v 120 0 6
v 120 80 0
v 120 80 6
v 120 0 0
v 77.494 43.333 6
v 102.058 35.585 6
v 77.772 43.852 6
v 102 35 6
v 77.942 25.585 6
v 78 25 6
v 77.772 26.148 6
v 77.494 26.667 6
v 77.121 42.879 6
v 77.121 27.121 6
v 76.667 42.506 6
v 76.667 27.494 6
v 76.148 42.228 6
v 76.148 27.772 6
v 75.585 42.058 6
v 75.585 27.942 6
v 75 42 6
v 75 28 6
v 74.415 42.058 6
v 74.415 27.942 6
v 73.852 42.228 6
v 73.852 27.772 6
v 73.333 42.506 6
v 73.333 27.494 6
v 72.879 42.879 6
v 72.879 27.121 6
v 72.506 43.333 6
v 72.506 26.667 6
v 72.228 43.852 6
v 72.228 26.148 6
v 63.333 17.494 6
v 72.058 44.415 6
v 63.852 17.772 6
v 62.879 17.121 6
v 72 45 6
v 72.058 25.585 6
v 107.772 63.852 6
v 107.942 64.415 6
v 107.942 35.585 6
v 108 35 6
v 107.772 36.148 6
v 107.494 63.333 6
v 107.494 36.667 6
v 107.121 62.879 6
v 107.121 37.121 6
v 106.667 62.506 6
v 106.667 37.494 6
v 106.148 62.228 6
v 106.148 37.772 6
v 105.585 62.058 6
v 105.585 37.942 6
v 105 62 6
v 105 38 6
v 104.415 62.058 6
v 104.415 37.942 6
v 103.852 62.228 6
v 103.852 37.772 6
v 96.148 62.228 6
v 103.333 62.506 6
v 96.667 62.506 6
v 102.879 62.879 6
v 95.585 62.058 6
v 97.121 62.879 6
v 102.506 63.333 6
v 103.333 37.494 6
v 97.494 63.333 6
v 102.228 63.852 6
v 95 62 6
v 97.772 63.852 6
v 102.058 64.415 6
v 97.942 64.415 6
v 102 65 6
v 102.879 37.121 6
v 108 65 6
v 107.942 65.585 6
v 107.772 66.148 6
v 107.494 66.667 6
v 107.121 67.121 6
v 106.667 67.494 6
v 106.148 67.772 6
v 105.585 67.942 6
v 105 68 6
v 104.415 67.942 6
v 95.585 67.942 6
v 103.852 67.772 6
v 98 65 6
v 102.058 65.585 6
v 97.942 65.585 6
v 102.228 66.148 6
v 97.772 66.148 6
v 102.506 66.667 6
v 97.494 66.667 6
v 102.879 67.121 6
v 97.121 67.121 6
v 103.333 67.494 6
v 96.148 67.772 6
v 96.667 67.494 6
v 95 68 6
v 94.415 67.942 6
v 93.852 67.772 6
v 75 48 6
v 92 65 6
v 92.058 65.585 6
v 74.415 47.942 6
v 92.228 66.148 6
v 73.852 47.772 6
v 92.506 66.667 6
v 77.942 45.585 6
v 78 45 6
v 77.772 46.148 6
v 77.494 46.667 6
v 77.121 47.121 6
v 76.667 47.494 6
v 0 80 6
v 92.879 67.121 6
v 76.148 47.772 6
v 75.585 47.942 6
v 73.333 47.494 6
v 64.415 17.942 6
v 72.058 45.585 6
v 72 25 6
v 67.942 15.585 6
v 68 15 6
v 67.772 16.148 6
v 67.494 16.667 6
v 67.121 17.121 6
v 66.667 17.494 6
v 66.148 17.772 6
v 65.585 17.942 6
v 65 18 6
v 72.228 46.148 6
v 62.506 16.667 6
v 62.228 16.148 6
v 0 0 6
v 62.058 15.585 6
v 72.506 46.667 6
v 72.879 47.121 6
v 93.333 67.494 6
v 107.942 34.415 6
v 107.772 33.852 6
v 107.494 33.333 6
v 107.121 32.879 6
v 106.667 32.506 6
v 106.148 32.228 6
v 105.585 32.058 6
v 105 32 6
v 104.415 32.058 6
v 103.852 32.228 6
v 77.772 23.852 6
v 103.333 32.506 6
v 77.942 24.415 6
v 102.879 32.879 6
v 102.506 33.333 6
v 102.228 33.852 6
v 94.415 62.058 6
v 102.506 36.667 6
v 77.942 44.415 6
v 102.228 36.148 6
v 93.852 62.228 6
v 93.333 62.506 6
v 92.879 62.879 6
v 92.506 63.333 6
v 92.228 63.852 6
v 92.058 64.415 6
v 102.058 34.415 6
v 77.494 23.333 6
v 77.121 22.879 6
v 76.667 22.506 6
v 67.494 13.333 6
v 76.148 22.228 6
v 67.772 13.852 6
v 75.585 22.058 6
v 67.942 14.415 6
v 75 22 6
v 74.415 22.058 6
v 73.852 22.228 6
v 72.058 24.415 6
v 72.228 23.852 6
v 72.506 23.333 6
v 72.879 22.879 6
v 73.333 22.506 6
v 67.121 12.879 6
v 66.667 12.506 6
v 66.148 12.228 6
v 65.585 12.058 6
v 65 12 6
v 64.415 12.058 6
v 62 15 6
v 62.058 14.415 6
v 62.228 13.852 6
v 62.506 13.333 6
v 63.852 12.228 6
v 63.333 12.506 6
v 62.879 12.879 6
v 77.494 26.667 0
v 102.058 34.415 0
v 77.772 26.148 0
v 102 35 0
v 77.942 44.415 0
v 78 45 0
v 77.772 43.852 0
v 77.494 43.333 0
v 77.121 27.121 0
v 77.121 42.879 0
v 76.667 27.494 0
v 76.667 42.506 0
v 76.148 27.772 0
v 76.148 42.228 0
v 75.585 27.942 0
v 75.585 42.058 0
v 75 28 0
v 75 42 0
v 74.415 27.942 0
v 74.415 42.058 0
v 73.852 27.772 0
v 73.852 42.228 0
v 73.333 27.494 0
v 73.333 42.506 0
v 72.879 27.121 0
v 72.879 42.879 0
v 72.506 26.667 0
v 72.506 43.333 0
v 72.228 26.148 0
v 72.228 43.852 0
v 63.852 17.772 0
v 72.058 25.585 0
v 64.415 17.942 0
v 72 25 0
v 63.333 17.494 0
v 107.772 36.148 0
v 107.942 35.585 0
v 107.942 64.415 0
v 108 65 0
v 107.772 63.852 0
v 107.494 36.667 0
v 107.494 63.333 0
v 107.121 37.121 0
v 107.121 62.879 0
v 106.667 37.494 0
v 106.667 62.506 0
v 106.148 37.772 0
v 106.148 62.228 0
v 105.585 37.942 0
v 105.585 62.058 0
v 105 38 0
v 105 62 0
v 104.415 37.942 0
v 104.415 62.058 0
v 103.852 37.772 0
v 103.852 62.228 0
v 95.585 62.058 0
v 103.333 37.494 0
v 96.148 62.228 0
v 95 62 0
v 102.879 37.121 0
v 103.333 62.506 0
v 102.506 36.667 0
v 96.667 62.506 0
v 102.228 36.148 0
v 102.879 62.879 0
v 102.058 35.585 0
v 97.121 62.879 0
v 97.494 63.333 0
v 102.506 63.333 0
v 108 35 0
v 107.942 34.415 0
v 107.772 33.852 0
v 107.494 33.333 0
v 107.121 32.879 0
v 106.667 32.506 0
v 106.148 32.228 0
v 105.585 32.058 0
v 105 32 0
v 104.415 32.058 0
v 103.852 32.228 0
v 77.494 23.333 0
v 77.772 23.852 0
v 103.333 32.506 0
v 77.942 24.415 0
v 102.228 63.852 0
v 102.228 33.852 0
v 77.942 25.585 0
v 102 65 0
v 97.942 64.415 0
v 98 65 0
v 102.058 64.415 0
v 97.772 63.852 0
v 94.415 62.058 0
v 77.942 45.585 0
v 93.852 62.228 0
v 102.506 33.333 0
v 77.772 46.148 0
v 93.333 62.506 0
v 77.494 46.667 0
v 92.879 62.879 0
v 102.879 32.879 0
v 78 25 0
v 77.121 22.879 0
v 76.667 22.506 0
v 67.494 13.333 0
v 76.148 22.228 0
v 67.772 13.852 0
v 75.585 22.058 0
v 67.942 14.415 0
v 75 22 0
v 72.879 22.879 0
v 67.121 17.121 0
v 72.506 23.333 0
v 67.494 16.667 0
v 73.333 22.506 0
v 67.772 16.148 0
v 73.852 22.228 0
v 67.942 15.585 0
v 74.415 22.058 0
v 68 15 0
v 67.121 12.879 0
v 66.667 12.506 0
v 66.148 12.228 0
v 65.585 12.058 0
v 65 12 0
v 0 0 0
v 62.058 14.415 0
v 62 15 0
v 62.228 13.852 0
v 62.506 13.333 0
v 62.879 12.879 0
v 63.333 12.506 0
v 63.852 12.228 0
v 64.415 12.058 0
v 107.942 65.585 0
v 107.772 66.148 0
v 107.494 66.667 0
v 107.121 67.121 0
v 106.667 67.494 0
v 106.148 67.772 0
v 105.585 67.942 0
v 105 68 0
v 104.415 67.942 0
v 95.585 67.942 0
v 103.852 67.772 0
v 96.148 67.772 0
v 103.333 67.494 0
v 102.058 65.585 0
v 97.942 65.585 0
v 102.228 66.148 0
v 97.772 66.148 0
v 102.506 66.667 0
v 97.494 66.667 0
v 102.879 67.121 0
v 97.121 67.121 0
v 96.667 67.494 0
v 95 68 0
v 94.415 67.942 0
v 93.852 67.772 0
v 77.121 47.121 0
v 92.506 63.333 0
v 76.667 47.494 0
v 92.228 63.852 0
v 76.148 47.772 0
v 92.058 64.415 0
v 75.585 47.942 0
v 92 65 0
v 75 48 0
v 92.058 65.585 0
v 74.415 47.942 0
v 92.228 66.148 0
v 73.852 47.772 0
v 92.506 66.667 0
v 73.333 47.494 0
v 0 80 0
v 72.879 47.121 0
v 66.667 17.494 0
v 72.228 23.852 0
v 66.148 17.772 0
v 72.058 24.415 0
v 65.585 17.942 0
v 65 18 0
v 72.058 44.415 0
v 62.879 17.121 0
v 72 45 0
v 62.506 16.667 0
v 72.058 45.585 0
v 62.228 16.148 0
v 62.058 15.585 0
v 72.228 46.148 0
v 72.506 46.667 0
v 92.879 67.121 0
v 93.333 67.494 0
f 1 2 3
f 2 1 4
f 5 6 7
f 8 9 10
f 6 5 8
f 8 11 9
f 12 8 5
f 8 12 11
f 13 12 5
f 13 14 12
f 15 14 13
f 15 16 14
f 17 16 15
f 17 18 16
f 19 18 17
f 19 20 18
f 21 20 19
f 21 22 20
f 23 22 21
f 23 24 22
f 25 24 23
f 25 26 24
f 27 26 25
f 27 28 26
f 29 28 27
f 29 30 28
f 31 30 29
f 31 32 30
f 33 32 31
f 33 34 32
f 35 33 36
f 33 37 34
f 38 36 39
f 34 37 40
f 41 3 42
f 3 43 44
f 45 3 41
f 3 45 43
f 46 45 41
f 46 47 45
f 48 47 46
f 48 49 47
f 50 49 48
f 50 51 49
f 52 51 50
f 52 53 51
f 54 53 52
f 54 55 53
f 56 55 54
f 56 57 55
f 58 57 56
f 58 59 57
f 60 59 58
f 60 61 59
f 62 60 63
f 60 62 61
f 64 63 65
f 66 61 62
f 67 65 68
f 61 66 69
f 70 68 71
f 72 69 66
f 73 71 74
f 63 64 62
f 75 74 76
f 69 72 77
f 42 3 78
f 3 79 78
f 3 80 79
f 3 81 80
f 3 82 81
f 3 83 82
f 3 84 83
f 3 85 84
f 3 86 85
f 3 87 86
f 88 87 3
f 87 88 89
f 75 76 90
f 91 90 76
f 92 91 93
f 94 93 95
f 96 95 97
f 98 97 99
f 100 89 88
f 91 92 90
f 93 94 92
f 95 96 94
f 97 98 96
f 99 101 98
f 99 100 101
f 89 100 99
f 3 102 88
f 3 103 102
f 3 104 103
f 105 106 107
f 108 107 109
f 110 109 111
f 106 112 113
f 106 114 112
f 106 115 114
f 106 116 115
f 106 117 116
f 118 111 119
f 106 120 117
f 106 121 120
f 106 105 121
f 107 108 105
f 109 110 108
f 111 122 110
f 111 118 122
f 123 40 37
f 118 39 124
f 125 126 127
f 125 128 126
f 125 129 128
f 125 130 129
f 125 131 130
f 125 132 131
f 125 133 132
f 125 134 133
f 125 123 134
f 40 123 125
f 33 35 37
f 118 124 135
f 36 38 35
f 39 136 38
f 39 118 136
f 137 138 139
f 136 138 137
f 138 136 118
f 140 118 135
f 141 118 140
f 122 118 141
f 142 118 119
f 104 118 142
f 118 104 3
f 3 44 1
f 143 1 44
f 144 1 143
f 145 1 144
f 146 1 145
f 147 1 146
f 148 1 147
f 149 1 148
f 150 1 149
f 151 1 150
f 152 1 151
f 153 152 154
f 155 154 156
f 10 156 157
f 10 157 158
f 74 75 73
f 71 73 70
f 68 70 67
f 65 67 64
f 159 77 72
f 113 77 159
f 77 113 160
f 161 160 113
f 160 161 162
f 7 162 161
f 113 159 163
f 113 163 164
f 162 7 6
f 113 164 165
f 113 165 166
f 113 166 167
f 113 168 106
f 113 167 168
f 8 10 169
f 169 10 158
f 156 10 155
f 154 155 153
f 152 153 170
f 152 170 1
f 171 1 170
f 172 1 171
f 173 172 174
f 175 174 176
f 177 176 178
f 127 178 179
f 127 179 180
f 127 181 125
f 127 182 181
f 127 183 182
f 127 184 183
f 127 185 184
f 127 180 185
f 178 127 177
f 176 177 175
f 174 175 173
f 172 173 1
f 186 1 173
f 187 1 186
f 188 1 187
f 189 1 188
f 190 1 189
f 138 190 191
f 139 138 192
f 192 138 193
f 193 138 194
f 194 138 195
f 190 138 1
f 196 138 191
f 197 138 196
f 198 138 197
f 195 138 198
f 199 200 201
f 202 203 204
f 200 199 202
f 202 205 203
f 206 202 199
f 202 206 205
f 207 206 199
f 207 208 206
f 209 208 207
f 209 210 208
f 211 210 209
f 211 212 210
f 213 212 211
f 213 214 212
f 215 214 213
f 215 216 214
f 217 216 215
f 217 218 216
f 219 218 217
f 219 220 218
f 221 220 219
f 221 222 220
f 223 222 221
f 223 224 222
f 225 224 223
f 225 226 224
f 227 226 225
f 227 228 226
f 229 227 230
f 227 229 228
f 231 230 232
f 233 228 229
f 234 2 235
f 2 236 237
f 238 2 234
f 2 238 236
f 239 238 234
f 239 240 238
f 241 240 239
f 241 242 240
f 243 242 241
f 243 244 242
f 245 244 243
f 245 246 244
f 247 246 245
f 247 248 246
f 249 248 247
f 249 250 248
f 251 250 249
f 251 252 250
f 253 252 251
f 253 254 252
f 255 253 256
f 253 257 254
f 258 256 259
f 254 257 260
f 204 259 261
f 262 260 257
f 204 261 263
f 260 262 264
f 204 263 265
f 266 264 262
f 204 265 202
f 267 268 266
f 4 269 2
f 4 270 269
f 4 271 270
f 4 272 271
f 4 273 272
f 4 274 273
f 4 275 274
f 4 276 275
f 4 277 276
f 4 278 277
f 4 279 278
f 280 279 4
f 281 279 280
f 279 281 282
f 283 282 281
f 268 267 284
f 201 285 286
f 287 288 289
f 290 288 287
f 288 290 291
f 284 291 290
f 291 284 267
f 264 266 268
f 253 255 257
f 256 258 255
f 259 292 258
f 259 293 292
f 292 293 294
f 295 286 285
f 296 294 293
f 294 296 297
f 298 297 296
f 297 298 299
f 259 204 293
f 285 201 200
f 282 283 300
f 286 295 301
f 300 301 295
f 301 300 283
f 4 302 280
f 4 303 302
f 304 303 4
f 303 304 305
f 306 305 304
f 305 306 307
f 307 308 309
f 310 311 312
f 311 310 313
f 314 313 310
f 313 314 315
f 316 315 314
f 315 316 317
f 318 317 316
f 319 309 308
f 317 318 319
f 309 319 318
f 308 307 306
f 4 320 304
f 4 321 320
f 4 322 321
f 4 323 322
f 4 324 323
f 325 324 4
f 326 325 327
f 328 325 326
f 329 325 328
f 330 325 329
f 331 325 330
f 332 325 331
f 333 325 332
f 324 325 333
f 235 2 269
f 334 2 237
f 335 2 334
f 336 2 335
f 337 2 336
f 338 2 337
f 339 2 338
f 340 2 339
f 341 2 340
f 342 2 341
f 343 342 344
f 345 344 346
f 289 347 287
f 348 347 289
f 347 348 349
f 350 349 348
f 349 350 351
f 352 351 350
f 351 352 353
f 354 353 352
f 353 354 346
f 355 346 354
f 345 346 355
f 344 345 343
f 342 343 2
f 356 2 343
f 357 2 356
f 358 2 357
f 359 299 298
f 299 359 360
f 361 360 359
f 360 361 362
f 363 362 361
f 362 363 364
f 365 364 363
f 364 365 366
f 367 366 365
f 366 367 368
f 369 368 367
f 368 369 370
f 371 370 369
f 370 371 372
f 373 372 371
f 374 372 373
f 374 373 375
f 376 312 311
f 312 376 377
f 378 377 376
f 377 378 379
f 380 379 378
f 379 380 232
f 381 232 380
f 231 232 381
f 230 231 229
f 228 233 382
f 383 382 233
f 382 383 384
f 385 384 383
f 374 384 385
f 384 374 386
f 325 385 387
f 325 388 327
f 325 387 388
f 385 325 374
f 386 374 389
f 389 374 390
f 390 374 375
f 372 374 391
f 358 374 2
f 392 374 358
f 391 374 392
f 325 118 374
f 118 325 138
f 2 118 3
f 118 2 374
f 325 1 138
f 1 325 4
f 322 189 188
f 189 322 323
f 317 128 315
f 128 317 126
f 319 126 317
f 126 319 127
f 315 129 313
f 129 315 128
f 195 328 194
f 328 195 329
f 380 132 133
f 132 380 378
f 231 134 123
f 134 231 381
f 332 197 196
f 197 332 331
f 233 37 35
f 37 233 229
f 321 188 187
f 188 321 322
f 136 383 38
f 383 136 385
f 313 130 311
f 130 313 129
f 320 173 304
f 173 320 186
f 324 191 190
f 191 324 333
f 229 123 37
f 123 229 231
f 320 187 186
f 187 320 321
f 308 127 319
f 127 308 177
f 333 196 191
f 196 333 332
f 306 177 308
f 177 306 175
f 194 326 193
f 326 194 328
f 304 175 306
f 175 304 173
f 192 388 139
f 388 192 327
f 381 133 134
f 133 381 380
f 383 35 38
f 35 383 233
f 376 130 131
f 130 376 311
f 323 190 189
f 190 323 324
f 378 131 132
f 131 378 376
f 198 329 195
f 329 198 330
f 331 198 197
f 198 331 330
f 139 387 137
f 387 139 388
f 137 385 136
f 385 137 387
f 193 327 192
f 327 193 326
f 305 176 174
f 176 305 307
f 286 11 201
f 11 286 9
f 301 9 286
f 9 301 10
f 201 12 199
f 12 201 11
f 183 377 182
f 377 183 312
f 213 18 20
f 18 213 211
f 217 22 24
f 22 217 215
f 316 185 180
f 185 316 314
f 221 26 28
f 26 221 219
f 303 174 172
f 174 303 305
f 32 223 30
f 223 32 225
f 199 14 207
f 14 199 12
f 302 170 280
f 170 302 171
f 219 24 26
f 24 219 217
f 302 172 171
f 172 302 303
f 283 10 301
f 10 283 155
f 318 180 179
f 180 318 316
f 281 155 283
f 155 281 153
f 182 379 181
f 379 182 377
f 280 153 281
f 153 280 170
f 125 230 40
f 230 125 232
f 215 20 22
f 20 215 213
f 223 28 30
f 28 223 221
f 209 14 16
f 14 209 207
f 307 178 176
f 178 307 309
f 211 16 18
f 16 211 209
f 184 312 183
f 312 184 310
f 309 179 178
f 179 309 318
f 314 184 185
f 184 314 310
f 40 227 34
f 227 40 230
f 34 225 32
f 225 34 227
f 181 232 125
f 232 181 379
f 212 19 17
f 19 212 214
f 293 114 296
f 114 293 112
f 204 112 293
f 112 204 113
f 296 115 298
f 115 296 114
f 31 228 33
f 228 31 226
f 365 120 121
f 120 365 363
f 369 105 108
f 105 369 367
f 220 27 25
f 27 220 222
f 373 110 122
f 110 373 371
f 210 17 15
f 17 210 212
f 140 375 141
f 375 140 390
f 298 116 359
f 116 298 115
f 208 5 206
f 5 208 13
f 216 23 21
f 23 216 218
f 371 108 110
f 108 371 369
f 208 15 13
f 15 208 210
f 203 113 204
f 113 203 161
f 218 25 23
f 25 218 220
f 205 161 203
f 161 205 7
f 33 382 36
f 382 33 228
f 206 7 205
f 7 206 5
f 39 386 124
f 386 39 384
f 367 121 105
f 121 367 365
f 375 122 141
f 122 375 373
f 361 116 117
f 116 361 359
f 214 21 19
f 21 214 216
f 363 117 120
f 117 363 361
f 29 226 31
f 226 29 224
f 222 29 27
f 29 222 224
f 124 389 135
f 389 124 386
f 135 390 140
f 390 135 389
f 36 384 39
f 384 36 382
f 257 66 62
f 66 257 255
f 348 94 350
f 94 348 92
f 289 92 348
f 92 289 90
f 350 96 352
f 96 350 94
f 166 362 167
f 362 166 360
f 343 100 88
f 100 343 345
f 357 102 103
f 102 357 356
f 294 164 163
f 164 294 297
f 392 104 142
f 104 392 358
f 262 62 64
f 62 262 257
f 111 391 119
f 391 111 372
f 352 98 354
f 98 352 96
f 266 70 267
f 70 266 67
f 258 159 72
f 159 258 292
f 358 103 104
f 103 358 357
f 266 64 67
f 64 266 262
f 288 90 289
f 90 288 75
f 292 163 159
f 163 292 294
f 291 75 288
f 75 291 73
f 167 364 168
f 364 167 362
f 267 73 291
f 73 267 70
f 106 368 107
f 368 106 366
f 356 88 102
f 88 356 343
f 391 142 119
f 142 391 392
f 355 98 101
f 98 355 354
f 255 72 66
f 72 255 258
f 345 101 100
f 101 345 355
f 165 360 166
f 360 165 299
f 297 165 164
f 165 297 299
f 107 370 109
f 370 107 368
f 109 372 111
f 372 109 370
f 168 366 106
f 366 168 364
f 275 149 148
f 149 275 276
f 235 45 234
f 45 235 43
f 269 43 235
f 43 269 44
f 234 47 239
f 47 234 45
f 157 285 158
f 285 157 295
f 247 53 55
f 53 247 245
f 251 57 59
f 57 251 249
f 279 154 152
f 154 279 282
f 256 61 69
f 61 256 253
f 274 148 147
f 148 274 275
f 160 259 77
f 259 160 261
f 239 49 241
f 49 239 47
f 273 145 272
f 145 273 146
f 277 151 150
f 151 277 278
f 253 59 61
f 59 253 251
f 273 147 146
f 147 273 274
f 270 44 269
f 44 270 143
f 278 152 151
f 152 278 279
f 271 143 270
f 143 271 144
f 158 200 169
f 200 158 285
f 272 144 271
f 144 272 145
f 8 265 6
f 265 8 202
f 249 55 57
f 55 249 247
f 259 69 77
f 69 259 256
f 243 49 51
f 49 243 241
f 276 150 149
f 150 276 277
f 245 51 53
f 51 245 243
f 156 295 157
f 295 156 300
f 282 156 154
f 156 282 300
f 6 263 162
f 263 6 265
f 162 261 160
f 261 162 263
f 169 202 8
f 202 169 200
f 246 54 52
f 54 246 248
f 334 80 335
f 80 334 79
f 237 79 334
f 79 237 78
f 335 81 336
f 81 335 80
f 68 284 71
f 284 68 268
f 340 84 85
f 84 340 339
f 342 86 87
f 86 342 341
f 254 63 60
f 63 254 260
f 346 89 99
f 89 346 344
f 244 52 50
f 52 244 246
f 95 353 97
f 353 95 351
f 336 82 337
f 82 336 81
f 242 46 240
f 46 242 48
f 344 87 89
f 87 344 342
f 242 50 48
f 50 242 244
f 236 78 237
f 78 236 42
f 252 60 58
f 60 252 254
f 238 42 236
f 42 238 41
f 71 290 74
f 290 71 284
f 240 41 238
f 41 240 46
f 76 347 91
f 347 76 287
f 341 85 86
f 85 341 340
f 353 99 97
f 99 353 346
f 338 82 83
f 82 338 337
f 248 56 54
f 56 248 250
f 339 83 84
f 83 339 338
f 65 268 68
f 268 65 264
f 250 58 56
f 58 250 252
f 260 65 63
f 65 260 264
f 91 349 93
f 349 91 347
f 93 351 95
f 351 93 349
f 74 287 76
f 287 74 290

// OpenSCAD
$fn = 32;

// ----------------------------------------------------------------------
// Hole field: plate with holes at given coordinates
// ----------------------------------------------------------------------

// --- parameters (mm) ---
plate_l = 120;            // plate length, X
plate_w = 80;             // plate width, Y
plate_t = 6;              // plate thickness, Z
hole_d = 6;               // hole diameter
fit_tol = 0.05;           // tolerance for press fits, mm
free_tol = 0.3;           // tolerance for clearance fits, mm

difference() {
  cube([plate_l, plate_w, plate_t]);
  translate([65, 15, -1]) cylinder(h = plate_t + 2, d = hole_d);
  translate([75, 25, -1]) cylinder(h = plate_t + 2, d = hole_d);
  translate([75, 45, -1]) cylinder(h = plate_t + 2, d = hole_d);
  translate([95, 65, -1]) cylinder(h = plate_t + 2, d = hole_d);
  translate([105, 35, -1]) cylinder(h = plate_t + 2, d = hole_d);
  translate([105, 65, -1]) cylinder(h = plate_t + 2, d = hole_d);
}
